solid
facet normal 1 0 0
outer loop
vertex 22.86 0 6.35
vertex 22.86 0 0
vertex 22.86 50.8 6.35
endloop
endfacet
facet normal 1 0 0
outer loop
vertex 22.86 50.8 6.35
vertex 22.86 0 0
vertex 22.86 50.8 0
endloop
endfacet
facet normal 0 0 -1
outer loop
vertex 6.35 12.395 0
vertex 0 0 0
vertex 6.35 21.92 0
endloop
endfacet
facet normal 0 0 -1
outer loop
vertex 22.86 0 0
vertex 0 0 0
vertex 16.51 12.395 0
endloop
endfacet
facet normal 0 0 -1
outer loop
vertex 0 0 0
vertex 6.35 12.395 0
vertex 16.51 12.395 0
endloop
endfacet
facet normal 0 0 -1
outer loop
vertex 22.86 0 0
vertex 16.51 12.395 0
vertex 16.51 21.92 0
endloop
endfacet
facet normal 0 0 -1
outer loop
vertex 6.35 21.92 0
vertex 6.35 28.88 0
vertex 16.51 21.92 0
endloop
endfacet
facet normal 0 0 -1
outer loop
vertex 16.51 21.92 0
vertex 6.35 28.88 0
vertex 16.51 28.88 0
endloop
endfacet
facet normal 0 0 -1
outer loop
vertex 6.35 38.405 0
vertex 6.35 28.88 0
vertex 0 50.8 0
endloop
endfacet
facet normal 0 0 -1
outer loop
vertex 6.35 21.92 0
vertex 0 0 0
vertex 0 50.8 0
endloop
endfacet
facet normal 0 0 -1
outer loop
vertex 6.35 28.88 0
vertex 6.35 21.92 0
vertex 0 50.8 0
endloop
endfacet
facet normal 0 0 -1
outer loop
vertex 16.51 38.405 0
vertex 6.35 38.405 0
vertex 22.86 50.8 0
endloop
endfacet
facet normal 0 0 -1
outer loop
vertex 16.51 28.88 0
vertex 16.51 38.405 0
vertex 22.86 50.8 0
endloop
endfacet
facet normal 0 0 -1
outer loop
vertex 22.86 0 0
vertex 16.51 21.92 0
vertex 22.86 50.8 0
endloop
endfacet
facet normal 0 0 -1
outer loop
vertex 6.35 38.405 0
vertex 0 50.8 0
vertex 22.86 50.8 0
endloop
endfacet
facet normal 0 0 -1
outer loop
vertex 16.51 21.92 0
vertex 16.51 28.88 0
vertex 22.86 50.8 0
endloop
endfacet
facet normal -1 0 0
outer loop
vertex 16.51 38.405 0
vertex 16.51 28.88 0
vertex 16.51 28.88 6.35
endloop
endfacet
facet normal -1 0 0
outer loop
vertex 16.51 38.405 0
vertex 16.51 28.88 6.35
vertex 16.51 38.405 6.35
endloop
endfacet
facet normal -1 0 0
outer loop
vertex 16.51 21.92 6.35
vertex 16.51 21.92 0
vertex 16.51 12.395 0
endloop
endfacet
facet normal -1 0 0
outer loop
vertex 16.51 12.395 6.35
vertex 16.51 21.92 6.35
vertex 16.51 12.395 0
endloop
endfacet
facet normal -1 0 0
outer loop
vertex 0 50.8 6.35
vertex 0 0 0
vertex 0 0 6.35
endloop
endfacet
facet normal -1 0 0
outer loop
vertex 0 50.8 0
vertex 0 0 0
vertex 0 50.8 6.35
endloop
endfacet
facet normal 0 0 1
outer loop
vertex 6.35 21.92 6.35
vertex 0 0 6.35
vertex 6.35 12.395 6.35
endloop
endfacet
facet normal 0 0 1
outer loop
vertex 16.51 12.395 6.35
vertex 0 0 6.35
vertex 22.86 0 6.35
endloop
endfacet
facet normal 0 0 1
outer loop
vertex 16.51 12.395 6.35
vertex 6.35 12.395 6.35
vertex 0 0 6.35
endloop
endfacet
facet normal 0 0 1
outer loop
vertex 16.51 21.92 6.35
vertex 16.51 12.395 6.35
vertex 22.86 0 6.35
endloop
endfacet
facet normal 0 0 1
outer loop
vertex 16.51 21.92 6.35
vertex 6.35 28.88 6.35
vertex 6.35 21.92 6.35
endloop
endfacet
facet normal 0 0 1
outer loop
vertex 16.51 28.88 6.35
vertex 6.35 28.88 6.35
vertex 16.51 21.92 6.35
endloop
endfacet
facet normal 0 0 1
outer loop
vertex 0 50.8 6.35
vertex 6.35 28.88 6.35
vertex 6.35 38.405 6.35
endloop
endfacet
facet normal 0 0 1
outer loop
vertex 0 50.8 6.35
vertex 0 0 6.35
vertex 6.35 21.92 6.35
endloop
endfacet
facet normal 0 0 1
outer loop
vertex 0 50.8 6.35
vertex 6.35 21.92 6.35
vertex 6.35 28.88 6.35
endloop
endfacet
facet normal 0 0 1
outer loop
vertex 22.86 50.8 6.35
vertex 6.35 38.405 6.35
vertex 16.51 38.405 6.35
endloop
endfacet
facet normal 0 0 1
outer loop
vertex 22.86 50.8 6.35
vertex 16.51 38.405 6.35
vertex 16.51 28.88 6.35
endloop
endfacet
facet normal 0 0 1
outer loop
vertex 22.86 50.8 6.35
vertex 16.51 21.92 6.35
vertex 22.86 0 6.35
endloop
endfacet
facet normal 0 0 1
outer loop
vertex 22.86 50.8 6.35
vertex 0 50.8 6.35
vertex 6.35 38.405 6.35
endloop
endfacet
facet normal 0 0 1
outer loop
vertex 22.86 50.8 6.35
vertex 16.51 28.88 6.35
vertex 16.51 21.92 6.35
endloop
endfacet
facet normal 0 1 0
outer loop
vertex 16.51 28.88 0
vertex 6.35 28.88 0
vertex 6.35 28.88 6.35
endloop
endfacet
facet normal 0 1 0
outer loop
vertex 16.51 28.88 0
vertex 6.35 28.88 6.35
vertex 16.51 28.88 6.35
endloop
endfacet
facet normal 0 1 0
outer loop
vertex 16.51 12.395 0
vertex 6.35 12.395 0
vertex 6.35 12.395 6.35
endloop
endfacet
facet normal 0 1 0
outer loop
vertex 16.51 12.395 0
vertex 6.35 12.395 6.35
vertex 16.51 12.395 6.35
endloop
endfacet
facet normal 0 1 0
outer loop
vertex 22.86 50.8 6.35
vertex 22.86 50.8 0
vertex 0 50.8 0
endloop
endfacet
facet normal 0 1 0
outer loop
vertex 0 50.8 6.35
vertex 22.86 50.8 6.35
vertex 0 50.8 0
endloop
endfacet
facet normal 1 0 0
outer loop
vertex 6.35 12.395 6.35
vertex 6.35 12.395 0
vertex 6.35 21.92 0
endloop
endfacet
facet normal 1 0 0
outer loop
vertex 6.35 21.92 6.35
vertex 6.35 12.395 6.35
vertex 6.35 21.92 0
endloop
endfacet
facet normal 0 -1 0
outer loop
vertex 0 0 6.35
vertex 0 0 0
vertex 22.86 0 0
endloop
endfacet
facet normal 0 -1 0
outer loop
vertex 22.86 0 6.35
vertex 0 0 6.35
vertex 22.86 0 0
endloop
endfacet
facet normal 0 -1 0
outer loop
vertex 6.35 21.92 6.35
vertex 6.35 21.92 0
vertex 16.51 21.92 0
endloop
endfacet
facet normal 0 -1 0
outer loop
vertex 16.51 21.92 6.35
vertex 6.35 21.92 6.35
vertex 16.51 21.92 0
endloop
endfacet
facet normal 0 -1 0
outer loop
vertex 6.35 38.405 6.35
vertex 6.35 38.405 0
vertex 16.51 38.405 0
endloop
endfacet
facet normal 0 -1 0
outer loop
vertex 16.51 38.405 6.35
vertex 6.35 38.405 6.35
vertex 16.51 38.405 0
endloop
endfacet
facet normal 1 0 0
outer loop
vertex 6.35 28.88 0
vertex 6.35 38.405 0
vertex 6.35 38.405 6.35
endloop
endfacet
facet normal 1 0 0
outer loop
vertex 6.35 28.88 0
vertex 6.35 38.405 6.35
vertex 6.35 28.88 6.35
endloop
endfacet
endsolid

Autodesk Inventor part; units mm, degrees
ref_plane "YZ Plane" through (0, 0, 0) normal (1, 0, 0) x (0, 1, 0)
ref_plane "XZ Plane" through (0, 0, 0) normal (0, 1, 0) x (-1, 0, 0)
ref_plane "XY Plane" through (0, 0, 0) normal (0, 0, 1) x (1, 0, 0)
sketch "Sketch1" plane through (0, 0, 0) normal (0, 0, 1) x (1, 0, 0)
  line L0 (0, 0) -> (0, 50.8)
  line L1 (0, 0) -> (22.86, 0)
  line L2 (22.86, 0) -> (22.86, 50.8)
  line L3 (22.86, 50.8) -> (0, 50.8)
  line L4 (6.35, 38.4048) -> (16.51, 38.4048)
  line L5 (6.35, 38.4048) -> (6.35, 28.8798)
  line L6 (6.35, 28.8798) -> (16.51, 28.8798)
  line L7 (16.51, 28.8798) -> (16.51, 38.4048)
  line L8 (0, 25.4) -> (22.86, 25.4) construction
  line L9 (6.35, 12.3952) -> (16.51, 12.3952)
  line L10 (6.35, 12.3952) -> (6.35, 21.9202)
  line L11 (6.35, 21.9202) -> (16.51, 21.9202)
  line L12 (16.51, 21.9202) -> (16.51, 12.3952)
  dimension "d0" = 50.8
  dimension "d1" = 22.86
  dimension "d2" = 10.16
  dimension "d3" = 12.3952
  dimension "d5" = 9.525
  dimension "d6" = 6.35
extrude "Extrusion1" add sketch "Sketch1" along normal blind 6.35
properties part number "ShortSupportRod"
